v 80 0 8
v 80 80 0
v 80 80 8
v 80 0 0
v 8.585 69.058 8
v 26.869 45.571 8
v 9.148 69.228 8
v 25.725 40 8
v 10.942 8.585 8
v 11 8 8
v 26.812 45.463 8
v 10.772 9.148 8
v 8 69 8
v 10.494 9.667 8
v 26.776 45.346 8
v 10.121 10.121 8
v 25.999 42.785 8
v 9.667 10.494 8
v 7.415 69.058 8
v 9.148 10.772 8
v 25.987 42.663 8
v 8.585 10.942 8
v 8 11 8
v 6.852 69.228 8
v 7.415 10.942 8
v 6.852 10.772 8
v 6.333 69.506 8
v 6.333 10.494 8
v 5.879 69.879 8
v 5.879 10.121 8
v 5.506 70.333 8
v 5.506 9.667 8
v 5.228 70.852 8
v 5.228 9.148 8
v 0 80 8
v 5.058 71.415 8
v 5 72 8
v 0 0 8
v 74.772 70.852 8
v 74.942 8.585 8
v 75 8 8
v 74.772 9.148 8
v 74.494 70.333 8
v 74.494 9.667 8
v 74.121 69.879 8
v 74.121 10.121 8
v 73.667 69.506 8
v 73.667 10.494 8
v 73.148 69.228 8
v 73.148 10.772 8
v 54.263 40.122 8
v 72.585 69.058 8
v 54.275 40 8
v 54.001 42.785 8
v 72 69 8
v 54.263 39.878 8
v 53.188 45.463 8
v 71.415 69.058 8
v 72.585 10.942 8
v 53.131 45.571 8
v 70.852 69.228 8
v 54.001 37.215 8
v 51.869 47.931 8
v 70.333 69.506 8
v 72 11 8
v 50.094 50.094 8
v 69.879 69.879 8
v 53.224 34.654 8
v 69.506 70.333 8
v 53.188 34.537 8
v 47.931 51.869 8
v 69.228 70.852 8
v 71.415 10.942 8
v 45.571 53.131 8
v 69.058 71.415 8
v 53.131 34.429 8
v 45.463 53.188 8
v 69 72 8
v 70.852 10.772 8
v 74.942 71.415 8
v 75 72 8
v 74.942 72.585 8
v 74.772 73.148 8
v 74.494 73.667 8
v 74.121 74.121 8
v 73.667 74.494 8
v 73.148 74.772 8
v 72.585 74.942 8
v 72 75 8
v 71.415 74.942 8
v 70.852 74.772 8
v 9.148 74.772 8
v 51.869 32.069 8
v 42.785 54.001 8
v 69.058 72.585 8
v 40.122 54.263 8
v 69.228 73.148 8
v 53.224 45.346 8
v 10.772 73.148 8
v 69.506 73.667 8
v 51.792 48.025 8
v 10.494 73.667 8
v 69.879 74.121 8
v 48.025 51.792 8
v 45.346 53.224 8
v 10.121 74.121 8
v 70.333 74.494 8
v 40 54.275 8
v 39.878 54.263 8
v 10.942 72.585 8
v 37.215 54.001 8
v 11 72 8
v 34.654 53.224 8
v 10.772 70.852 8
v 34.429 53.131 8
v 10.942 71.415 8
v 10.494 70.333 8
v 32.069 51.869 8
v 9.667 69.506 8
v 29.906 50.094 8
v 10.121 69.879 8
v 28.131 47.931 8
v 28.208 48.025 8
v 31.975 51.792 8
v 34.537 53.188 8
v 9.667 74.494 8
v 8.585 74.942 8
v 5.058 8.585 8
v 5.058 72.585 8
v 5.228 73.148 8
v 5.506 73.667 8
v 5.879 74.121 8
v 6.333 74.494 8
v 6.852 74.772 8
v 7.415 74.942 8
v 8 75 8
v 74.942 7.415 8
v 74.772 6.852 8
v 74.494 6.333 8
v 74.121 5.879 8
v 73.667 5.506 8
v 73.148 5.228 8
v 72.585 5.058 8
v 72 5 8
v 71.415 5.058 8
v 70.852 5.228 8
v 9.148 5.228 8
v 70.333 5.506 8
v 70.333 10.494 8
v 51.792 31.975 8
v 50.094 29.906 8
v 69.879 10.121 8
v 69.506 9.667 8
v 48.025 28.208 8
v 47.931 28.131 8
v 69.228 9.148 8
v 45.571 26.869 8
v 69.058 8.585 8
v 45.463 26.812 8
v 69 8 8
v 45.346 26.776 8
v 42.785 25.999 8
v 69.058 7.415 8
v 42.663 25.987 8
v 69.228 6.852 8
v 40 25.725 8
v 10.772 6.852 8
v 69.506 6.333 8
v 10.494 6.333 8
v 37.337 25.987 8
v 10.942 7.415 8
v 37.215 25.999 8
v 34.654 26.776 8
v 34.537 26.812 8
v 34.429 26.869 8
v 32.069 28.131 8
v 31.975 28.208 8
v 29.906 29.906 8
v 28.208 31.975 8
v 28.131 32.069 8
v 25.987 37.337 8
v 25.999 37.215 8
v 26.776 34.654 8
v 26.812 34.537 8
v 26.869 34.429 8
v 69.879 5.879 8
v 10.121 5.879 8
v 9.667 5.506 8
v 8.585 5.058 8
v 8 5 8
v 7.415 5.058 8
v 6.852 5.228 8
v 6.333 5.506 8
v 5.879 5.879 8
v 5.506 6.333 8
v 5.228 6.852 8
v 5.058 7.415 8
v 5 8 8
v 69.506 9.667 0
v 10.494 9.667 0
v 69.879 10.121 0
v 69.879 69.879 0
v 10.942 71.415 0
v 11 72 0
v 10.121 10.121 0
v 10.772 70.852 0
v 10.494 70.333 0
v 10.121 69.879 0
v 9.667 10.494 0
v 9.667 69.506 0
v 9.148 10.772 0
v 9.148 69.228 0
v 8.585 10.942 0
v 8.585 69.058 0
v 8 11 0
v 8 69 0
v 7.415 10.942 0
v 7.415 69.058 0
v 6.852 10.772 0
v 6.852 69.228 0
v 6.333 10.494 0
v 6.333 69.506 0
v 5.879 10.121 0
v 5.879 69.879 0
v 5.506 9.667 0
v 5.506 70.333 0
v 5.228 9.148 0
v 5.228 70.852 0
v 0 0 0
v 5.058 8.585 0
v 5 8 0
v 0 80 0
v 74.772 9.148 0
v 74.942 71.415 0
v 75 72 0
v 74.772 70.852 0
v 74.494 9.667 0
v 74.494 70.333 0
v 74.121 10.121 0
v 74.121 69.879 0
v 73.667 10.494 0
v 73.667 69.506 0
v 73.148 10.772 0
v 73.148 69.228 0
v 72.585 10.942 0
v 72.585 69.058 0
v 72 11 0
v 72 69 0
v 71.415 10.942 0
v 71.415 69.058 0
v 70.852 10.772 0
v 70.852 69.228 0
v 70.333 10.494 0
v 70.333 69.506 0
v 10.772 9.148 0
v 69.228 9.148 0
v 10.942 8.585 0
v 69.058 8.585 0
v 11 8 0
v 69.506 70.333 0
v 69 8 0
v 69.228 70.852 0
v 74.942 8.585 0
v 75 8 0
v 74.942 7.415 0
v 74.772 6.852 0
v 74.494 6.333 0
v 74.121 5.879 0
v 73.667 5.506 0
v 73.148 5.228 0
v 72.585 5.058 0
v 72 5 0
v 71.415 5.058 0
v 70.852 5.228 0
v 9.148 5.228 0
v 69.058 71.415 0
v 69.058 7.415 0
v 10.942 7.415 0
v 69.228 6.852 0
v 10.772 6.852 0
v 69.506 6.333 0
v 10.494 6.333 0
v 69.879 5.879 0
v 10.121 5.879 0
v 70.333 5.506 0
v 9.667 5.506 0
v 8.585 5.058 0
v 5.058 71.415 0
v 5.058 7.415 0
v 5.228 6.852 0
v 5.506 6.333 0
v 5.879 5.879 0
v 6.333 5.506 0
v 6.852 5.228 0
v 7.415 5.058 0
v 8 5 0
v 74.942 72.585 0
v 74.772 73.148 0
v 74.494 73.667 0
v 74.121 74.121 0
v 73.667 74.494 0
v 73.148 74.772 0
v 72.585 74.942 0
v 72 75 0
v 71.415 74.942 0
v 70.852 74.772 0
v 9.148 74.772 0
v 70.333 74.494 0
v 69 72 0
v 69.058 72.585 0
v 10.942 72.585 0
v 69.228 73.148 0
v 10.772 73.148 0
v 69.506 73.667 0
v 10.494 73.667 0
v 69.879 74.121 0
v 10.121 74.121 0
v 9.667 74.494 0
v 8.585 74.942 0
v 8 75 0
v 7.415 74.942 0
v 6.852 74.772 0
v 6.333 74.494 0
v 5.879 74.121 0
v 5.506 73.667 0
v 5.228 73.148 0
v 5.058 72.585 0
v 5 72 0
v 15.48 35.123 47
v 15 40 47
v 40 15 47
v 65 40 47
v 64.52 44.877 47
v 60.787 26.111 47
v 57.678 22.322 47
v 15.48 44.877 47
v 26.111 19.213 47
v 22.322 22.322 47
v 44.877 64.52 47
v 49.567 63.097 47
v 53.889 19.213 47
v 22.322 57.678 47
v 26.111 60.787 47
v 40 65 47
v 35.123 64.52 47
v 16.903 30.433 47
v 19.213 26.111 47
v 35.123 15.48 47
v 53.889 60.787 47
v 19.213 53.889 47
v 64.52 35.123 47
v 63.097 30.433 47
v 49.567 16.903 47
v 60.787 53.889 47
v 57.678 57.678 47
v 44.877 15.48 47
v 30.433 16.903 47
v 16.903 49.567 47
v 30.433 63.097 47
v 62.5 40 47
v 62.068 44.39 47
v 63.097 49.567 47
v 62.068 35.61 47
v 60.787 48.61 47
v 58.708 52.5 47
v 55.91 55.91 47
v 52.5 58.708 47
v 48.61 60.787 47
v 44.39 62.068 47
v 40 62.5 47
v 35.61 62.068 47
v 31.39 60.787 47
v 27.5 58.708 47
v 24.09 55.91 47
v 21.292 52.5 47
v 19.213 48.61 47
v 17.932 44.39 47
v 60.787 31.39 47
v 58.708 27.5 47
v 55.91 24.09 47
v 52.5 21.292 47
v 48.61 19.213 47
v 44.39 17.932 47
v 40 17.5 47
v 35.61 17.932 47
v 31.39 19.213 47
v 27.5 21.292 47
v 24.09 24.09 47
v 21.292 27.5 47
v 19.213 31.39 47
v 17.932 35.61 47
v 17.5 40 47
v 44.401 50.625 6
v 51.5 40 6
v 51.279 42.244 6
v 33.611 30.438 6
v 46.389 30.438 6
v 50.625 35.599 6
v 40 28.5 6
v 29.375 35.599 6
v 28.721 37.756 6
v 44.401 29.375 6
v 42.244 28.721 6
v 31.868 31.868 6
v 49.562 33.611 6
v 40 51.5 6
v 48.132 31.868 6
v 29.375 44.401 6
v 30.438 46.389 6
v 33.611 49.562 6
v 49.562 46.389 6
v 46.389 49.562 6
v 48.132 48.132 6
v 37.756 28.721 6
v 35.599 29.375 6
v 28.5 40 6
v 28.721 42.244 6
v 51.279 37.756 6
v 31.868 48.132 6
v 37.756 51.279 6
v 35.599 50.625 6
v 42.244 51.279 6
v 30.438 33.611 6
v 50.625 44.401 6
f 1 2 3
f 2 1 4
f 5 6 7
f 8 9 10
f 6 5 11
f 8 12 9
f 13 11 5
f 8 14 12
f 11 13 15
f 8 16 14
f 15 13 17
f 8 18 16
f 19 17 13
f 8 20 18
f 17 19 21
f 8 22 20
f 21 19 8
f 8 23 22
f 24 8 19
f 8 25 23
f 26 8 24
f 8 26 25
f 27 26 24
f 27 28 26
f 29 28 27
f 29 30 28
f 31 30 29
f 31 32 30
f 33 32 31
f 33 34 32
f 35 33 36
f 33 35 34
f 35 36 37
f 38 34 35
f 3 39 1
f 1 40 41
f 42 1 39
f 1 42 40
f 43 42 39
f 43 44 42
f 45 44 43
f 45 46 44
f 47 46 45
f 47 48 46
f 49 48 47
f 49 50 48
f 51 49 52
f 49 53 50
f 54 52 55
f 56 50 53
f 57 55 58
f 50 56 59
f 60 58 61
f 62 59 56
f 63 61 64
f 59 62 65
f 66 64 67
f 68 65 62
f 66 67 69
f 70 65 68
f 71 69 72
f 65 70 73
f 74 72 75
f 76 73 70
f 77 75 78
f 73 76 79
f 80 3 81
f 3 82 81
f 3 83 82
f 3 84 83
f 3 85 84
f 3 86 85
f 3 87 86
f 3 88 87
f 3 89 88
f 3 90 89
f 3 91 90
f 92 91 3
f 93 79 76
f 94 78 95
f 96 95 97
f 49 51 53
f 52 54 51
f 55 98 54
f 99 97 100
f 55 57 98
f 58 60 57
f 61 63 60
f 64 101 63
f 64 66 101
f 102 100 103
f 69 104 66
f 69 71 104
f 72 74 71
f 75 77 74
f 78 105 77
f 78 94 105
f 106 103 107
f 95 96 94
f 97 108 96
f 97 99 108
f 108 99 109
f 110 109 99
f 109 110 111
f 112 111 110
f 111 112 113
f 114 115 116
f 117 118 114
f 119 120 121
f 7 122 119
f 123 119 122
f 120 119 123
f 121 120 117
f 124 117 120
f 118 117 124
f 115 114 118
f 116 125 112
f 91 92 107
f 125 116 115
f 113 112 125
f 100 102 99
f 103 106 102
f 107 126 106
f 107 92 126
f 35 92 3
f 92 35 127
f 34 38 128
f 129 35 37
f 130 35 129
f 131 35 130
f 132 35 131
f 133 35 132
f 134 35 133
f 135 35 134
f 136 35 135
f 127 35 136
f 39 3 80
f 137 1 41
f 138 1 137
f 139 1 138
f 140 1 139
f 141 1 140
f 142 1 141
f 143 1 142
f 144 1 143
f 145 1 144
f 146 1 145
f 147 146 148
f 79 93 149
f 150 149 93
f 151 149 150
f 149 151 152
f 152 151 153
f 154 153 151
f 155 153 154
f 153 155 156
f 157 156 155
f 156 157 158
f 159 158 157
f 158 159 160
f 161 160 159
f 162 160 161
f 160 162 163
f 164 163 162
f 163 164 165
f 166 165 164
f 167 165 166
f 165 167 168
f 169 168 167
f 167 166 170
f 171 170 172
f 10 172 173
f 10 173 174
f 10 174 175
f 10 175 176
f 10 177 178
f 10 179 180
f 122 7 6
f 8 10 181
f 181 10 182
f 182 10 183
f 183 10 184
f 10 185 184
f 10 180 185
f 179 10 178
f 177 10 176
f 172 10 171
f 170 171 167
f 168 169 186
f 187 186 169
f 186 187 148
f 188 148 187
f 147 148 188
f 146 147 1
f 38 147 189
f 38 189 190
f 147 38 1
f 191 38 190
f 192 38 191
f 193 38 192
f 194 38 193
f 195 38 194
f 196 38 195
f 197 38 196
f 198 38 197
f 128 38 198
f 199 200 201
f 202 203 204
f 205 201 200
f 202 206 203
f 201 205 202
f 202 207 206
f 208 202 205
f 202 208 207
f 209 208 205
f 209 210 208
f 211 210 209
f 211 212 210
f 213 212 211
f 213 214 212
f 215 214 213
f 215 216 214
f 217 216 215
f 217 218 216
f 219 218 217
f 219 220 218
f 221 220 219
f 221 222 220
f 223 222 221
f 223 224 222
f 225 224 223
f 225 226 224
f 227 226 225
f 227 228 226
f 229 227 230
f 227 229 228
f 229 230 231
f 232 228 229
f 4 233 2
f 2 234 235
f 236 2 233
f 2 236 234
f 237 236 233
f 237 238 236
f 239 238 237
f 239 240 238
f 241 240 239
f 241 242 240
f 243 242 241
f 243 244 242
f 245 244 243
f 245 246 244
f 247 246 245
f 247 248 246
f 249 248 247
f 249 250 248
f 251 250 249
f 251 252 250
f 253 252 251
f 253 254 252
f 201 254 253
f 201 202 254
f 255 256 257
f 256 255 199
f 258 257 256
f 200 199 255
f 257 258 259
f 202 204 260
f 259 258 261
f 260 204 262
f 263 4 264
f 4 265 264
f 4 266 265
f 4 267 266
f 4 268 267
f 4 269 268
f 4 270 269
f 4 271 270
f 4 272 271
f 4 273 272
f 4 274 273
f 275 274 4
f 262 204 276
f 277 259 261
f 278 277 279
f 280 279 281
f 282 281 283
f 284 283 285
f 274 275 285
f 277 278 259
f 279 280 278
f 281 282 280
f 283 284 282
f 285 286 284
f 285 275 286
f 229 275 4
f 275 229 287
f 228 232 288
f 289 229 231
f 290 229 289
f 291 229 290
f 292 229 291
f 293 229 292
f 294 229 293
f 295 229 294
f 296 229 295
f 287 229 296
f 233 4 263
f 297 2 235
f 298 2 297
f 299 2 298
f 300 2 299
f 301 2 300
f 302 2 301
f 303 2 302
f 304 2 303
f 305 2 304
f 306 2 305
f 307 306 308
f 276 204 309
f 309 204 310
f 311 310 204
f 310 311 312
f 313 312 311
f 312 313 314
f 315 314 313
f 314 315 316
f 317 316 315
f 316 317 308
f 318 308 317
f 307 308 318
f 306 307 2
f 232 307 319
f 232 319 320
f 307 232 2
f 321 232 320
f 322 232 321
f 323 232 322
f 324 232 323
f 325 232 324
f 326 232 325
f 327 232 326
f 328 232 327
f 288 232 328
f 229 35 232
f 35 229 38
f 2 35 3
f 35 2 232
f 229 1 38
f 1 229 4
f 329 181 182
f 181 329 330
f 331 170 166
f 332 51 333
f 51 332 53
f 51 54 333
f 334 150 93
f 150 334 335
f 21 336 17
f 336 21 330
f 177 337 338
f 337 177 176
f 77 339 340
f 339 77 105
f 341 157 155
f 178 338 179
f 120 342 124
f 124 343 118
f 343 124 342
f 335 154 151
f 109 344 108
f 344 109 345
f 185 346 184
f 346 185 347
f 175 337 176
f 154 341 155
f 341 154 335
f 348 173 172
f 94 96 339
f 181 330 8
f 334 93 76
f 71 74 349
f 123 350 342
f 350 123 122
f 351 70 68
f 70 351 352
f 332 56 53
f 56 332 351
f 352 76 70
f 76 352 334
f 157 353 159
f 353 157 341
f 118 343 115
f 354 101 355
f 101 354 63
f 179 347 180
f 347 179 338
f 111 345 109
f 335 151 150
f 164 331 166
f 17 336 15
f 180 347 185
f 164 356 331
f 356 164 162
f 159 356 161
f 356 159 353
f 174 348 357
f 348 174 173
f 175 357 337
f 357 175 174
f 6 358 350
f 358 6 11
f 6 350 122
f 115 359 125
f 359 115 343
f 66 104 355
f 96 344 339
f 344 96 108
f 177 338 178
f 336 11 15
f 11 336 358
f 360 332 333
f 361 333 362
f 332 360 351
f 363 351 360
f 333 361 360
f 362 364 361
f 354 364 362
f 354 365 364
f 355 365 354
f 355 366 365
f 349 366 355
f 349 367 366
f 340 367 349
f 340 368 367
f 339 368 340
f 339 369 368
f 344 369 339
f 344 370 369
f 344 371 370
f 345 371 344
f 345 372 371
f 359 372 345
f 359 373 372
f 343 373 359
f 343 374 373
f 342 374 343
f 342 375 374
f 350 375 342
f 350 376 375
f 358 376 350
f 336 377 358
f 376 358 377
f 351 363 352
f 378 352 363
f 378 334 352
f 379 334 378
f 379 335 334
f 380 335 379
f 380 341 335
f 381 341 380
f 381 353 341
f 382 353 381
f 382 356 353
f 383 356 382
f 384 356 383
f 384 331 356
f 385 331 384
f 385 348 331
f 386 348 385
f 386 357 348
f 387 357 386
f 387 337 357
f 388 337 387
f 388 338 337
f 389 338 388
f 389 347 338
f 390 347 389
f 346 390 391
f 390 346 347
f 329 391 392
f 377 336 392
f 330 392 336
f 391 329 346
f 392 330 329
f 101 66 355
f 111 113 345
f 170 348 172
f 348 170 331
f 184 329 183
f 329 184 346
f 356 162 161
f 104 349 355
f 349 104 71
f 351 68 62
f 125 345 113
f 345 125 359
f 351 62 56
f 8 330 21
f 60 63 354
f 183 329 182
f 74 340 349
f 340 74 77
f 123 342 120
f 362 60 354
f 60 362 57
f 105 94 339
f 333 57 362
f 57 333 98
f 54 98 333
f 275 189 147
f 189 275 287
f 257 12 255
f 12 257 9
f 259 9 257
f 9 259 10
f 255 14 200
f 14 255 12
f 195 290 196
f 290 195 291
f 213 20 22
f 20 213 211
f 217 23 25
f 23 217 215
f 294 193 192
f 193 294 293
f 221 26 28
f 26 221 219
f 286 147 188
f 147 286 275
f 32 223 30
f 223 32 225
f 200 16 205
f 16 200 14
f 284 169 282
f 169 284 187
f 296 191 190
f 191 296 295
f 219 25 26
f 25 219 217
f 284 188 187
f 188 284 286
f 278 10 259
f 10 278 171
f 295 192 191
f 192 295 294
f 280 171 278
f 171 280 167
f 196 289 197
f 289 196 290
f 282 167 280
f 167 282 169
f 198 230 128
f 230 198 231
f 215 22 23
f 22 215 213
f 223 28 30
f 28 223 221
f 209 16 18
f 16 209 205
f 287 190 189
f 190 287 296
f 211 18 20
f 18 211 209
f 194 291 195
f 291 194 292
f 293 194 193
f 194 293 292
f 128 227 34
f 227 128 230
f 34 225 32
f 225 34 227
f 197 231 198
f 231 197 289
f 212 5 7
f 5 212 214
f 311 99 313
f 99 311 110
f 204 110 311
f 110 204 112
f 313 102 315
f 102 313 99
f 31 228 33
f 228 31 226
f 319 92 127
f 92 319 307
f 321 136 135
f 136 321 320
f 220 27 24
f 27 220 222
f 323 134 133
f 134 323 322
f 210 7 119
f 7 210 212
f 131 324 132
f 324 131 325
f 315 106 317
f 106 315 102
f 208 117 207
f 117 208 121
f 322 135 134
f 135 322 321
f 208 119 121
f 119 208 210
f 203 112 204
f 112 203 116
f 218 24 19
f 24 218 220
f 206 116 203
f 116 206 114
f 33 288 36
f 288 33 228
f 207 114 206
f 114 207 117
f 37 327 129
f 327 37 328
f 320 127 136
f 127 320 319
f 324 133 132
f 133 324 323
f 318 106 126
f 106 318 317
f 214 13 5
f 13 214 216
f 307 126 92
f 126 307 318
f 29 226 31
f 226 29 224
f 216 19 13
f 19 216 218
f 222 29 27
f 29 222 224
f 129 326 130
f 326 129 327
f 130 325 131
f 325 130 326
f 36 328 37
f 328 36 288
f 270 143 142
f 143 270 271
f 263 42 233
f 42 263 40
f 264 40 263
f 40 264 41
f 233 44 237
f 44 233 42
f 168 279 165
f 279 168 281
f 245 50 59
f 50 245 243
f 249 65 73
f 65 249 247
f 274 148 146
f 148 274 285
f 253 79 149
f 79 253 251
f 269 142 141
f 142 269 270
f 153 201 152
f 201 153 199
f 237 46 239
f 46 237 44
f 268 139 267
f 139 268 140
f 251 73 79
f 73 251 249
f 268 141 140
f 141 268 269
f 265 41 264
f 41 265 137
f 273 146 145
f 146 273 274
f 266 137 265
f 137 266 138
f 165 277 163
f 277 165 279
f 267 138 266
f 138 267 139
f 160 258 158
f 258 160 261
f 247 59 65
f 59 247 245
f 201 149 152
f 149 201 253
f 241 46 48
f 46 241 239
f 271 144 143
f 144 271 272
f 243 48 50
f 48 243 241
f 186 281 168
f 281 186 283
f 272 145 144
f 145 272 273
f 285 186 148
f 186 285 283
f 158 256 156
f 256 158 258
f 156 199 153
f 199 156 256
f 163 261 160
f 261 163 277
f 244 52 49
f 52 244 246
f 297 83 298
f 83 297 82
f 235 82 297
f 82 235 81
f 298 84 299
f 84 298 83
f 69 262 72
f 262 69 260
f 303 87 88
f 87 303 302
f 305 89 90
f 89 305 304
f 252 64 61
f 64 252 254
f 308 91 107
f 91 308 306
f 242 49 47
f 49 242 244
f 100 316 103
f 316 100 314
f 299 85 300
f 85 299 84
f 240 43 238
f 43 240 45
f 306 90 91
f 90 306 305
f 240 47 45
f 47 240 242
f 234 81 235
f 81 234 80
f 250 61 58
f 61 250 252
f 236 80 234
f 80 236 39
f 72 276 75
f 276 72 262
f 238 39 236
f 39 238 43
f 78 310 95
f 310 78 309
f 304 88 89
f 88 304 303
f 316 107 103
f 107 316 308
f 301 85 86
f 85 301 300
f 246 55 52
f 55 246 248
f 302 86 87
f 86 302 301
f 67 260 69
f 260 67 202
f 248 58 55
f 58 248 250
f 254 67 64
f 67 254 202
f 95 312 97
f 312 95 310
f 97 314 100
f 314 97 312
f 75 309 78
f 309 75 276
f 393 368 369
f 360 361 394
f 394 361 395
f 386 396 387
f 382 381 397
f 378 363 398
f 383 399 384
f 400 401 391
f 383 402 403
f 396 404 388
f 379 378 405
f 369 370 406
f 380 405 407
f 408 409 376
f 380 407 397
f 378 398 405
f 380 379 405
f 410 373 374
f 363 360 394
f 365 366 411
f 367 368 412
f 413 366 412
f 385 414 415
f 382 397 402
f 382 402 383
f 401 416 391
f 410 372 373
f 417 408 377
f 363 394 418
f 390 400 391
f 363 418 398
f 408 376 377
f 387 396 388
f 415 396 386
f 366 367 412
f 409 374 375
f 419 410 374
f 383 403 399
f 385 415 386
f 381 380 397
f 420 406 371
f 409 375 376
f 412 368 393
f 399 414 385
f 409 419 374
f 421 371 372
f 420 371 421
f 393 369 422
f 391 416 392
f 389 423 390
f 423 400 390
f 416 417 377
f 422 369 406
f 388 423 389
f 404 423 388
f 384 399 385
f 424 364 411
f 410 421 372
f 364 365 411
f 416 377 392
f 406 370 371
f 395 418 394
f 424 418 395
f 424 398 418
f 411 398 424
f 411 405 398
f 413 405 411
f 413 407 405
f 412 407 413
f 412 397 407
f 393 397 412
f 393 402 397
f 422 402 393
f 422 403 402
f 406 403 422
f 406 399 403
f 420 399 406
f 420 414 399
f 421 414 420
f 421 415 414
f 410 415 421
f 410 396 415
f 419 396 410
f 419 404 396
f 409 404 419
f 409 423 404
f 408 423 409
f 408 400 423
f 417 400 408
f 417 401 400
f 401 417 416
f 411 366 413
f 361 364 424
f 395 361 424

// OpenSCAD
$fn = 32;

// ----------------------------------------------------------------------
// Hopper: flanged with square flange
// ----------------------------------------------------------------------

// --- parameters (mm) ---
fl = 80;                  // flange side, X and Y
fl_t = 8;                 // flange thickness
cone_h = 40;              // cone height above the flange
top_d = 50;               // cone mouth diameter
bot_d = 28;               // cone spout diameter
wall = 2.5;               // cone wall thickness
hole_r = 3;               // flange hole radius
hole_in = 8;              // hole inset from the corners

bore_d = bot_d - 2 * wall;  // spout bore diameter
total_h = fl_t + cone_h - 1;  // overall height

difference() {
  union() {
    cube([fl, fl, fl_t]);
    translate([fl / 2, fl / 2, fl_t - 1])
      cylinder(h = cone_h, d1 = bot_d, d2 = top_d);
  }
  translate([fl / 2, fl / 2, fl_t - 2])
    cylinder(h = cone_h + 1, d1 = bore_d, d2 = top_d - 2 * wall);
  for (sx = [0, 1], sy = [0, 1])
    translate([sx ? fl - hole_in : hole_in,
               sy ? fl - hole_in : hole_in, -1])
      cylinder(r = hole_r, h = fl_t + 2);
}
